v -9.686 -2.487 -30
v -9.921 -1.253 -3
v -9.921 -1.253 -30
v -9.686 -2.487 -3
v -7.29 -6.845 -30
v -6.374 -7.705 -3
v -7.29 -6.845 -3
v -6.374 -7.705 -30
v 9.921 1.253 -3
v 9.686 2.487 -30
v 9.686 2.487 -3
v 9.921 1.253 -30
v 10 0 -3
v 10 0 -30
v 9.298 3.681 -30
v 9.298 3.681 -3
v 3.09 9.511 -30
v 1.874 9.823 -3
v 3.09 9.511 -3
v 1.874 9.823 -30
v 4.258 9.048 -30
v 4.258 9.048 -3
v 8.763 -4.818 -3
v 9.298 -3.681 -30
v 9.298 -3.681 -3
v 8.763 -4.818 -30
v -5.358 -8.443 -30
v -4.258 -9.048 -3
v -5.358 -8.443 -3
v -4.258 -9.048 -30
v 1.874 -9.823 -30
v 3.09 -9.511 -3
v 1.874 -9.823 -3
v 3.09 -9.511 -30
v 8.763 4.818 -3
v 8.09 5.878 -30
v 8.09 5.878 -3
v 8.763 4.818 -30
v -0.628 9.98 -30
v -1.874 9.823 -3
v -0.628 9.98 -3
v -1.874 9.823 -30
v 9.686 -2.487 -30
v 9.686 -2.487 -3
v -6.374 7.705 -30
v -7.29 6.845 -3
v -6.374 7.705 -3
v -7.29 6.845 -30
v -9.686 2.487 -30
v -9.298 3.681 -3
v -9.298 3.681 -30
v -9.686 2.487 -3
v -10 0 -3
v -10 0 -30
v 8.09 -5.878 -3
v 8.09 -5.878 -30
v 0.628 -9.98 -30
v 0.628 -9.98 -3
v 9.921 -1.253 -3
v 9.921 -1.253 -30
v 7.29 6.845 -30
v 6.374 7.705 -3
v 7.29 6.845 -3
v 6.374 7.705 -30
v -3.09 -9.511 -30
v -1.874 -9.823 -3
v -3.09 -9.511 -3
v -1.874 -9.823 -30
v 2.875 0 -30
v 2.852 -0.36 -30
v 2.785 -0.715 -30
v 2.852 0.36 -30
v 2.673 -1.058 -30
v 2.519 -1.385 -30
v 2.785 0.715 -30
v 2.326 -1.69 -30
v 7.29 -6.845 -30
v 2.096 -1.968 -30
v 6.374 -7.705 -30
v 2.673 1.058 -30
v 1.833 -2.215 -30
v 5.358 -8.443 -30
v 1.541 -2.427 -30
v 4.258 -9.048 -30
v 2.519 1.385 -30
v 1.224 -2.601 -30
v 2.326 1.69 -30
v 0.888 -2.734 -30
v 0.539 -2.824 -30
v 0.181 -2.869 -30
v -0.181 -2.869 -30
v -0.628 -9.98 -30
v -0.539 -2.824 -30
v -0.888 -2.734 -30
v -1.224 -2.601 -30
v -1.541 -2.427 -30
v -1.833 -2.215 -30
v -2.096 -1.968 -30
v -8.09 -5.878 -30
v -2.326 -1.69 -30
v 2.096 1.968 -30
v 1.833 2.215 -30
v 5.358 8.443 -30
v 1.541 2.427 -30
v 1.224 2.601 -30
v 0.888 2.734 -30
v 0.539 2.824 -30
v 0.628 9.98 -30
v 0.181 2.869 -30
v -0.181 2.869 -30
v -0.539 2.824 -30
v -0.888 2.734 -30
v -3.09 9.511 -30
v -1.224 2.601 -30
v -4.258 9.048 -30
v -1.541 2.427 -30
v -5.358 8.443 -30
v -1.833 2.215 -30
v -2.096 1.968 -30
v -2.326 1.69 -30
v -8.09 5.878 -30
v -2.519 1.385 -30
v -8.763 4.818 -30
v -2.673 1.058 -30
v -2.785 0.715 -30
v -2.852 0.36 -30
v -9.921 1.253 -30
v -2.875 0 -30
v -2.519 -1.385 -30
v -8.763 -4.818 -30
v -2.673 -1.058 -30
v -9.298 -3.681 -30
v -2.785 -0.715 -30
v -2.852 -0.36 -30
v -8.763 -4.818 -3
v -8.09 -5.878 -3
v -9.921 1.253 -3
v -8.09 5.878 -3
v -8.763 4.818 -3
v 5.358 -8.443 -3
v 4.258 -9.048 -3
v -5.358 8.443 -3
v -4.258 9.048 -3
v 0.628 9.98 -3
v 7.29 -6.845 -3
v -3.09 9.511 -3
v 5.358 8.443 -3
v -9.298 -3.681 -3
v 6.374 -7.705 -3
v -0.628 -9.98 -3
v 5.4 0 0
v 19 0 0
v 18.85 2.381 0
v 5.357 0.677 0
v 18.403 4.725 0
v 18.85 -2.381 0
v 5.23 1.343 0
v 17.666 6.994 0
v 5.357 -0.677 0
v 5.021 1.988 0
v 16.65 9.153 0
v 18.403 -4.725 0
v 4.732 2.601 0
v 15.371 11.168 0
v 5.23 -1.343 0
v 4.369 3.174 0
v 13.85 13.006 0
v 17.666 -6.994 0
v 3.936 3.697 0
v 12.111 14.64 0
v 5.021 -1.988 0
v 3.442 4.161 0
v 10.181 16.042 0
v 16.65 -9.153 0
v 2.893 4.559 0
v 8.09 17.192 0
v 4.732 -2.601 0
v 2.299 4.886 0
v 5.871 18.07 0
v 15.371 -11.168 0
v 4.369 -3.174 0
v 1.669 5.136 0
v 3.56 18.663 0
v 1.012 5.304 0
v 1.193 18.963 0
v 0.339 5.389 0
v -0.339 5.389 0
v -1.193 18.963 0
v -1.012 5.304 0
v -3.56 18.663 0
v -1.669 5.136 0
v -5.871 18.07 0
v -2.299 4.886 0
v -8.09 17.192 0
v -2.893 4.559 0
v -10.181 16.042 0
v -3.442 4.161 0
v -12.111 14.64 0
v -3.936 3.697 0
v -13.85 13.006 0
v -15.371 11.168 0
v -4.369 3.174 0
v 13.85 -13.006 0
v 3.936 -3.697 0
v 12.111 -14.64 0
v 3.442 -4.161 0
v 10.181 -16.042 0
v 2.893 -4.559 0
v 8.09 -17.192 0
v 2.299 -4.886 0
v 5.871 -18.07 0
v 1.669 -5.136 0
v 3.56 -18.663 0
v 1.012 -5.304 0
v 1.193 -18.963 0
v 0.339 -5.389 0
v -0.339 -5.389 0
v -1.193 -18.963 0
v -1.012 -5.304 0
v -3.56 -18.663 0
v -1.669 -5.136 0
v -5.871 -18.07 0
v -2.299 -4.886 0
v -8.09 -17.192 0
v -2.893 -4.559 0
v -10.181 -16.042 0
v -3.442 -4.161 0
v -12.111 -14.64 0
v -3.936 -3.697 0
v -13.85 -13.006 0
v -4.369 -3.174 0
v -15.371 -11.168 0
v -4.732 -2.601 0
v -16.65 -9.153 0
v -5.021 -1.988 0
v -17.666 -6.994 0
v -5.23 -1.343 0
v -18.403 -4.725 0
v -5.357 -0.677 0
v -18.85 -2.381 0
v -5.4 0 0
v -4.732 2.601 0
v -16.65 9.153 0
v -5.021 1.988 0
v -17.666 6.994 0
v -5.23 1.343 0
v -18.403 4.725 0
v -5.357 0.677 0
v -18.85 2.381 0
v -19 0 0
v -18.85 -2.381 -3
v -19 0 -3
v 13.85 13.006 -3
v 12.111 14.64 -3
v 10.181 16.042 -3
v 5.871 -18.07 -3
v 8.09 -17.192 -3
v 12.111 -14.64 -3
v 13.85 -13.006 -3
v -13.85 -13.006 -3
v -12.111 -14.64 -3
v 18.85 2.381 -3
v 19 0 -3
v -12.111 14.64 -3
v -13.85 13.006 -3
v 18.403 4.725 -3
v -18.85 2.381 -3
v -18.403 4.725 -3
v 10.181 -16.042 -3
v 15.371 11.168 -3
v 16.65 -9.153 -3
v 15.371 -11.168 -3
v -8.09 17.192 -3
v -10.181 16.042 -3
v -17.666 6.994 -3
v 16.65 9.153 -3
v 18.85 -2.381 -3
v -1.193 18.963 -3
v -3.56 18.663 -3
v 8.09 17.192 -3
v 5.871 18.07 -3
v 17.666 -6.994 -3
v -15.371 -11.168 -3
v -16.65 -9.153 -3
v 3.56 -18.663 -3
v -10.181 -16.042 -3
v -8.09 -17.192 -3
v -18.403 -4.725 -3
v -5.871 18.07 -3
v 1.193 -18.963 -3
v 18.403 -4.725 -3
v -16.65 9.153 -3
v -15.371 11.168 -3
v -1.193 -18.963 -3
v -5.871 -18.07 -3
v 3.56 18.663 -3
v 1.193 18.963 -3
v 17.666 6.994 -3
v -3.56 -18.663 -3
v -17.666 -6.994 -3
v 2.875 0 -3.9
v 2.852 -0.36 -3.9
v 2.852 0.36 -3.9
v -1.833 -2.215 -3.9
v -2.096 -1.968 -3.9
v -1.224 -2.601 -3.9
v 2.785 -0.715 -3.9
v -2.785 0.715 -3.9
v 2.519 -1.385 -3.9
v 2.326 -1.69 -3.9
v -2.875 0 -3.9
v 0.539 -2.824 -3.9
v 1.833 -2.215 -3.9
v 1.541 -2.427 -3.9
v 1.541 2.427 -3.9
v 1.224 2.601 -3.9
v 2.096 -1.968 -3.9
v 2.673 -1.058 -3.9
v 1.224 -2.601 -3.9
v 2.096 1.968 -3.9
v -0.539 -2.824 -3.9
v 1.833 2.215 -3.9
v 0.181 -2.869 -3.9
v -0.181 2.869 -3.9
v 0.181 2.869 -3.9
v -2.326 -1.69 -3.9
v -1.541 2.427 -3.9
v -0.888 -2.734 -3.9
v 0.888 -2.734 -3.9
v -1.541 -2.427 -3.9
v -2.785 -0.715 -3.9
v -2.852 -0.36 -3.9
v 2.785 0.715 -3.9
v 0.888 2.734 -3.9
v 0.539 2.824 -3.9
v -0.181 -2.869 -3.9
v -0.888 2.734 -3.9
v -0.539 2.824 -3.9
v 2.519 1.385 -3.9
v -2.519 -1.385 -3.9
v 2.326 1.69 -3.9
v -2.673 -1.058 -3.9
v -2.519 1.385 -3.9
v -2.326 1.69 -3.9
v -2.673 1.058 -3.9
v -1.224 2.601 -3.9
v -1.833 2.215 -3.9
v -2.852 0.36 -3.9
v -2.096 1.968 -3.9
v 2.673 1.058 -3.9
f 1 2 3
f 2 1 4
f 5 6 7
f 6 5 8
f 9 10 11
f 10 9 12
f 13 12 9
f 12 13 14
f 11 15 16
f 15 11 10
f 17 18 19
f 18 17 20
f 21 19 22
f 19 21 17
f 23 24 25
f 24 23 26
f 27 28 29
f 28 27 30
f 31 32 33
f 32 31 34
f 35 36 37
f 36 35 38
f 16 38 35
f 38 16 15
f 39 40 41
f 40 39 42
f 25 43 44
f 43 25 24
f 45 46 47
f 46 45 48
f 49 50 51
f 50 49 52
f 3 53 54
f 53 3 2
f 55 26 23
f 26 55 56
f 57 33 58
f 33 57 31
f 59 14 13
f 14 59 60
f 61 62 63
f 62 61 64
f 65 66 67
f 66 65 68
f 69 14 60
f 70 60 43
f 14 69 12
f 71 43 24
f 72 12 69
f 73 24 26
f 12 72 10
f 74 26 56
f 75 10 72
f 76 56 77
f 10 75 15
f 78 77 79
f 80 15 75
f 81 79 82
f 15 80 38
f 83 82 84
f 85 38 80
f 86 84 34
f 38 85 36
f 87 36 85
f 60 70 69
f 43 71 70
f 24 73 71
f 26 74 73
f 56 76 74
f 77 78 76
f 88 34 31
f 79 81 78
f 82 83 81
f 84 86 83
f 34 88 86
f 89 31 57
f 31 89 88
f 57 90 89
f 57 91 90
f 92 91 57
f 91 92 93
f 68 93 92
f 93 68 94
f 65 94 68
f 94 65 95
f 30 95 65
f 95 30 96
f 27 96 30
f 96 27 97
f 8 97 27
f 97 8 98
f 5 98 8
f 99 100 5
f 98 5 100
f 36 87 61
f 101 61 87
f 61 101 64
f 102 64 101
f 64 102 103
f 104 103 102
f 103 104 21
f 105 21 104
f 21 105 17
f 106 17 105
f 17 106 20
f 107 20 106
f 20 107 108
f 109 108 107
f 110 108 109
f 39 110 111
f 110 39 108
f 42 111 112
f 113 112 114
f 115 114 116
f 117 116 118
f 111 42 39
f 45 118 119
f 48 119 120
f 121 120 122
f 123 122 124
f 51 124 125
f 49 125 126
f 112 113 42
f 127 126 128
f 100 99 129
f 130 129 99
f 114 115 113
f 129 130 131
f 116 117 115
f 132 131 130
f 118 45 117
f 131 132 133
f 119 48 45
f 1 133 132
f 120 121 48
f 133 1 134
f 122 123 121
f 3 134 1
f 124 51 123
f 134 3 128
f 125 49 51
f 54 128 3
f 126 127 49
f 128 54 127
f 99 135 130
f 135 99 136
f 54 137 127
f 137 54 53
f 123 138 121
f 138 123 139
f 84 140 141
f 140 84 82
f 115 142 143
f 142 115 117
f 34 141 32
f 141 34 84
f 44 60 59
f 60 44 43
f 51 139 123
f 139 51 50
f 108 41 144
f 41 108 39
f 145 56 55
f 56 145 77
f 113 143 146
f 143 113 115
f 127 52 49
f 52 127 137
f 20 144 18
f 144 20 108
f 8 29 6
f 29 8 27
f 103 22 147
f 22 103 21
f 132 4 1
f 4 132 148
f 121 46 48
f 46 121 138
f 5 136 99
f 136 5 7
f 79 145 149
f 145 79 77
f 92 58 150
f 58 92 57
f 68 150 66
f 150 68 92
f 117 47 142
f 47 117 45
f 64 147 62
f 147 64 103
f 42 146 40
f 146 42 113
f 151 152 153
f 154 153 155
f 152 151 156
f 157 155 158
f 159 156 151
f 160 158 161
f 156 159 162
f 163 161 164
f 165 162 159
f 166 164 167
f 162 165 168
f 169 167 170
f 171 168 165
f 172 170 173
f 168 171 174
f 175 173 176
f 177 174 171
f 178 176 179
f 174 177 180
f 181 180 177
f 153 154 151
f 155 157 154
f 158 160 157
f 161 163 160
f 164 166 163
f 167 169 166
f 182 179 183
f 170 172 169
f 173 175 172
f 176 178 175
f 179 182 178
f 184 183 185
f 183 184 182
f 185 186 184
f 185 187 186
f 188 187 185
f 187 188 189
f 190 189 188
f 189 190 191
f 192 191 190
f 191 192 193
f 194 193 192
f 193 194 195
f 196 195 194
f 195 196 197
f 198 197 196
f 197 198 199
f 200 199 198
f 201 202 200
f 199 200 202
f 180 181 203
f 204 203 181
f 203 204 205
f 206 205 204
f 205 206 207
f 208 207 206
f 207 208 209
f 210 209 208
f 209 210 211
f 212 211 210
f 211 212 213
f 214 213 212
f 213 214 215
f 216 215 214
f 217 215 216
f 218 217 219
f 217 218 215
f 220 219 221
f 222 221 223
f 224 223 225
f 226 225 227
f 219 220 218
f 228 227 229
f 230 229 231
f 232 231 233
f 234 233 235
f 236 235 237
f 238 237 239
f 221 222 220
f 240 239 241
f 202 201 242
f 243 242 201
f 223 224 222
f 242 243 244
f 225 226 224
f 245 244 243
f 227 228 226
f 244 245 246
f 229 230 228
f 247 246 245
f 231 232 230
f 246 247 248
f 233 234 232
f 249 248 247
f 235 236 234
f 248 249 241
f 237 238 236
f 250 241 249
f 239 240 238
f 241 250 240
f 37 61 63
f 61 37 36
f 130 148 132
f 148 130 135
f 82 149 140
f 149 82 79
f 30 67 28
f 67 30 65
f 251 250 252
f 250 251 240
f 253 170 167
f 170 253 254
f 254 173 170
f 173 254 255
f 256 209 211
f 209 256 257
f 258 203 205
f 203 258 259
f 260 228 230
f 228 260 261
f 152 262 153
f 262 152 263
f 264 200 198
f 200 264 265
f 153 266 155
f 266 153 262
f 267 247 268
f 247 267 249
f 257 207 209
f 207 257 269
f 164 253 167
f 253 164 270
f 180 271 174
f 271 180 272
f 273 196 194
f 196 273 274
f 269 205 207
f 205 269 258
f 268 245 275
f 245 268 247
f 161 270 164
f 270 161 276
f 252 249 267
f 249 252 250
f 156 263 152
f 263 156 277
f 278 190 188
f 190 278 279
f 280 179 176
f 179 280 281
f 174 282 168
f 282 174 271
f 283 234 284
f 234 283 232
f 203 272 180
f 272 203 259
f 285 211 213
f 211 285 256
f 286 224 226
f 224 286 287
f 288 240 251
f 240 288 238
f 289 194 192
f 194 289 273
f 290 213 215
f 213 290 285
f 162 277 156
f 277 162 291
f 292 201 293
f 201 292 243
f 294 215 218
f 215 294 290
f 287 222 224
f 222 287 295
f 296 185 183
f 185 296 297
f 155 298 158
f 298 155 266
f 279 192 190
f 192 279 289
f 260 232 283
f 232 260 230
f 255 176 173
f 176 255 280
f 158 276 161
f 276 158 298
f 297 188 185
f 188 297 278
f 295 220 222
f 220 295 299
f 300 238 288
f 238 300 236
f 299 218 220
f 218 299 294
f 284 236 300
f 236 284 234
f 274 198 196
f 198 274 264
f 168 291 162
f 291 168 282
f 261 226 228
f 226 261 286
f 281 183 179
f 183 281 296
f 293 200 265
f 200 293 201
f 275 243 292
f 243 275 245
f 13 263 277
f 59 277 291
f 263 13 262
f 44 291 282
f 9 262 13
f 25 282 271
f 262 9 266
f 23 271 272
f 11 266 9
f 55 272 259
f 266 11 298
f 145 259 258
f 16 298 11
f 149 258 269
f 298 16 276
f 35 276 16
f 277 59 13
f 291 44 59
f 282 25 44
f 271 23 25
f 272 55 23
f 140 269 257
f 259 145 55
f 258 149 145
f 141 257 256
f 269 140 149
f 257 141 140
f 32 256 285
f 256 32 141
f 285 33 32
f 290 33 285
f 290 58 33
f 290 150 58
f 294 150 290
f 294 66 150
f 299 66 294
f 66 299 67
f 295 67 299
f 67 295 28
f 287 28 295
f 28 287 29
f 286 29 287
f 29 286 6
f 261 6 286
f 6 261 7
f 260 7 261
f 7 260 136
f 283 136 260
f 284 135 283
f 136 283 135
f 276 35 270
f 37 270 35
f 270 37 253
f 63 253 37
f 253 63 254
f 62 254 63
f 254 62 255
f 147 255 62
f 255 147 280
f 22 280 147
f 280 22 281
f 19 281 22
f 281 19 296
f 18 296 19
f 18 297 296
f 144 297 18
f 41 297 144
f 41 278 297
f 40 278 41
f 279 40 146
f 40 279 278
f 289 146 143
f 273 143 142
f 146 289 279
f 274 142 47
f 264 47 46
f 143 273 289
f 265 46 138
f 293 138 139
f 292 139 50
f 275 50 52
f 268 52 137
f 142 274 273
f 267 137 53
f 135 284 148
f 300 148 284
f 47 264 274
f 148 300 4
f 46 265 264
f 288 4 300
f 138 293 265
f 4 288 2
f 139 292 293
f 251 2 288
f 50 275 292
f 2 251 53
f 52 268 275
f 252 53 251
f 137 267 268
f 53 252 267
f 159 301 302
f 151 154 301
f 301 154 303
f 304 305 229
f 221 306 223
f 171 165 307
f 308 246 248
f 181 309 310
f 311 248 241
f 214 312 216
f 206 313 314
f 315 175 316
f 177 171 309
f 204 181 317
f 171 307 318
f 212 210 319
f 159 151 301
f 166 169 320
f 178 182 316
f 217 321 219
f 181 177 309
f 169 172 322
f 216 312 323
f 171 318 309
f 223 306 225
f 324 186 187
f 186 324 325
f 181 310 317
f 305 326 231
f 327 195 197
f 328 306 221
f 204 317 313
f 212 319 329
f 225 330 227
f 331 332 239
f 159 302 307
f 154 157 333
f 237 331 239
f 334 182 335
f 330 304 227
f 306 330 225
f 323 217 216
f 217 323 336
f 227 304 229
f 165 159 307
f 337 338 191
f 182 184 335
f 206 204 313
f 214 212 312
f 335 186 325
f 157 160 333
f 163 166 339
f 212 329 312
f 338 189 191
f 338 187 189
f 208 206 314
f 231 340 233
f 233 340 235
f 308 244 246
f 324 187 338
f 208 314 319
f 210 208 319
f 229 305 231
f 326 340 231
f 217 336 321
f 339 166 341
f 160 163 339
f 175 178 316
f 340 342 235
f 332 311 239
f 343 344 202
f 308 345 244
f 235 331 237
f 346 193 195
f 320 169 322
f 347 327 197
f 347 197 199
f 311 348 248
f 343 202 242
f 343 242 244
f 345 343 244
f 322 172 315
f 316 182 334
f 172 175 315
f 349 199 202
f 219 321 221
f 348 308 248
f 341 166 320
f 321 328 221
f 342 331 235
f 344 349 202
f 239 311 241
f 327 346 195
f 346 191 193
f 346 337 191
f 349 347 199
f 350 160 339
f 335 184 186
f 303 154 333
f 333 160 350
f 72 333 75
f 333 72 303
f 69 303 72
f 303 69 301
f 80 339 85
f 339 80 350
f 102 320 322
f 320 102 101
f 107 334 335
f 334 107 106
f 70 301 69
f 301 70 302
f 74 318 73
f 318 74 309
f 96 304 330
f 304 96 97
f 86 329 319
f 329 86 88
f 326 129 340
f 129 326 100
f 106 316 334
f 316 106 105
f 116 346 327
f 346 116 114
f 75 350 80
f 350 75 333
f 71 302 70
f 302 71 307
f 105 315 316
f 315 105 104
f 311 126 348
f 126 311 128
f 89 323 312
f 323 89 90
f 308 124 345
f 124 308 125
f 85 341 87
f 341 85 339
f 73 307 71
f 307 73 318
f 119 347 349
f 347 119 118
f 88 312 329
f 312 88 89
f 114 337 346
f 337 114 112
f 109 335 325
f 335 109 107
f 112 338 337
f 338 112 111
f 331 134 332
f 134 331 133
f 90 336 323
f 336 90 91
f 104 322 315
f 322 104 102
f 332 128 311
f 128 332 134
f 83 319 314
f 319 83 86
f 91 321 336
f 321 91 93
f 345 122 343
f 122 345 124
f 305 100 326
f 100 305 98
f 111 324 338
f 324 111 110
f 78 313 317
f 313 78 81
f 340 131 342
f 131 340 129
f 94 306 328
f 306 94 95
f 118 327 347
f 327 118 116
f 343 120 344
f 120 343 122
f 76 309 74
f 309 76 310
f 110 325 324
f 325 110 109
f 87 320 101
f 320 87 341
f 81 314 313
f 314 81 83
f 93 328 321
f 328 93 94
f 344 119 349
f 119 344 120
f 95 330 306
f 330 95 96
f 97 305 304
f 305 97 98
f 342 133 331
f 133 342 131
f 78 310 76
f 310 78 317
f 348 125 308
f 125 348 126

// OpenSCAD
$fn = 50;


difference() {
	union() {
		translate(v = [0, 0, -30.0000000000]) {
			cylinder(h = 30, r = 10.0000000000);
		}
		translate(v = [0, 0, -3.0000000000]) {
			cylinder(h = 3, r = 19.0000000000);
		}
	}
	union() {
		translate(v = [0, 0, 0]) {
			rotate(a = [0, 0, 0]) {
				difference() {
					union() {
						#translate(v = [0, 0, -30.0000000000]) {
							cylinder(h = 30, r = 2.6000000000);
						}
						#translate(v = [0, 0, -3.9000000000]) {
							cylinder(h = 3.9000000000, r1 = 2.8750000000, r2 = 5.4000000000);
						}
						#translate(v = [0, 0, -30.0000000000]) {
							cylinder(h = 30, r = 2.8750000000);
						}
						#translate(v = [0, 0, -30.0000000000]) {
							cylinder(h = 30, r = 2.6000000000);
						}
					}
					union();
				}
			}
		}
	}
}
